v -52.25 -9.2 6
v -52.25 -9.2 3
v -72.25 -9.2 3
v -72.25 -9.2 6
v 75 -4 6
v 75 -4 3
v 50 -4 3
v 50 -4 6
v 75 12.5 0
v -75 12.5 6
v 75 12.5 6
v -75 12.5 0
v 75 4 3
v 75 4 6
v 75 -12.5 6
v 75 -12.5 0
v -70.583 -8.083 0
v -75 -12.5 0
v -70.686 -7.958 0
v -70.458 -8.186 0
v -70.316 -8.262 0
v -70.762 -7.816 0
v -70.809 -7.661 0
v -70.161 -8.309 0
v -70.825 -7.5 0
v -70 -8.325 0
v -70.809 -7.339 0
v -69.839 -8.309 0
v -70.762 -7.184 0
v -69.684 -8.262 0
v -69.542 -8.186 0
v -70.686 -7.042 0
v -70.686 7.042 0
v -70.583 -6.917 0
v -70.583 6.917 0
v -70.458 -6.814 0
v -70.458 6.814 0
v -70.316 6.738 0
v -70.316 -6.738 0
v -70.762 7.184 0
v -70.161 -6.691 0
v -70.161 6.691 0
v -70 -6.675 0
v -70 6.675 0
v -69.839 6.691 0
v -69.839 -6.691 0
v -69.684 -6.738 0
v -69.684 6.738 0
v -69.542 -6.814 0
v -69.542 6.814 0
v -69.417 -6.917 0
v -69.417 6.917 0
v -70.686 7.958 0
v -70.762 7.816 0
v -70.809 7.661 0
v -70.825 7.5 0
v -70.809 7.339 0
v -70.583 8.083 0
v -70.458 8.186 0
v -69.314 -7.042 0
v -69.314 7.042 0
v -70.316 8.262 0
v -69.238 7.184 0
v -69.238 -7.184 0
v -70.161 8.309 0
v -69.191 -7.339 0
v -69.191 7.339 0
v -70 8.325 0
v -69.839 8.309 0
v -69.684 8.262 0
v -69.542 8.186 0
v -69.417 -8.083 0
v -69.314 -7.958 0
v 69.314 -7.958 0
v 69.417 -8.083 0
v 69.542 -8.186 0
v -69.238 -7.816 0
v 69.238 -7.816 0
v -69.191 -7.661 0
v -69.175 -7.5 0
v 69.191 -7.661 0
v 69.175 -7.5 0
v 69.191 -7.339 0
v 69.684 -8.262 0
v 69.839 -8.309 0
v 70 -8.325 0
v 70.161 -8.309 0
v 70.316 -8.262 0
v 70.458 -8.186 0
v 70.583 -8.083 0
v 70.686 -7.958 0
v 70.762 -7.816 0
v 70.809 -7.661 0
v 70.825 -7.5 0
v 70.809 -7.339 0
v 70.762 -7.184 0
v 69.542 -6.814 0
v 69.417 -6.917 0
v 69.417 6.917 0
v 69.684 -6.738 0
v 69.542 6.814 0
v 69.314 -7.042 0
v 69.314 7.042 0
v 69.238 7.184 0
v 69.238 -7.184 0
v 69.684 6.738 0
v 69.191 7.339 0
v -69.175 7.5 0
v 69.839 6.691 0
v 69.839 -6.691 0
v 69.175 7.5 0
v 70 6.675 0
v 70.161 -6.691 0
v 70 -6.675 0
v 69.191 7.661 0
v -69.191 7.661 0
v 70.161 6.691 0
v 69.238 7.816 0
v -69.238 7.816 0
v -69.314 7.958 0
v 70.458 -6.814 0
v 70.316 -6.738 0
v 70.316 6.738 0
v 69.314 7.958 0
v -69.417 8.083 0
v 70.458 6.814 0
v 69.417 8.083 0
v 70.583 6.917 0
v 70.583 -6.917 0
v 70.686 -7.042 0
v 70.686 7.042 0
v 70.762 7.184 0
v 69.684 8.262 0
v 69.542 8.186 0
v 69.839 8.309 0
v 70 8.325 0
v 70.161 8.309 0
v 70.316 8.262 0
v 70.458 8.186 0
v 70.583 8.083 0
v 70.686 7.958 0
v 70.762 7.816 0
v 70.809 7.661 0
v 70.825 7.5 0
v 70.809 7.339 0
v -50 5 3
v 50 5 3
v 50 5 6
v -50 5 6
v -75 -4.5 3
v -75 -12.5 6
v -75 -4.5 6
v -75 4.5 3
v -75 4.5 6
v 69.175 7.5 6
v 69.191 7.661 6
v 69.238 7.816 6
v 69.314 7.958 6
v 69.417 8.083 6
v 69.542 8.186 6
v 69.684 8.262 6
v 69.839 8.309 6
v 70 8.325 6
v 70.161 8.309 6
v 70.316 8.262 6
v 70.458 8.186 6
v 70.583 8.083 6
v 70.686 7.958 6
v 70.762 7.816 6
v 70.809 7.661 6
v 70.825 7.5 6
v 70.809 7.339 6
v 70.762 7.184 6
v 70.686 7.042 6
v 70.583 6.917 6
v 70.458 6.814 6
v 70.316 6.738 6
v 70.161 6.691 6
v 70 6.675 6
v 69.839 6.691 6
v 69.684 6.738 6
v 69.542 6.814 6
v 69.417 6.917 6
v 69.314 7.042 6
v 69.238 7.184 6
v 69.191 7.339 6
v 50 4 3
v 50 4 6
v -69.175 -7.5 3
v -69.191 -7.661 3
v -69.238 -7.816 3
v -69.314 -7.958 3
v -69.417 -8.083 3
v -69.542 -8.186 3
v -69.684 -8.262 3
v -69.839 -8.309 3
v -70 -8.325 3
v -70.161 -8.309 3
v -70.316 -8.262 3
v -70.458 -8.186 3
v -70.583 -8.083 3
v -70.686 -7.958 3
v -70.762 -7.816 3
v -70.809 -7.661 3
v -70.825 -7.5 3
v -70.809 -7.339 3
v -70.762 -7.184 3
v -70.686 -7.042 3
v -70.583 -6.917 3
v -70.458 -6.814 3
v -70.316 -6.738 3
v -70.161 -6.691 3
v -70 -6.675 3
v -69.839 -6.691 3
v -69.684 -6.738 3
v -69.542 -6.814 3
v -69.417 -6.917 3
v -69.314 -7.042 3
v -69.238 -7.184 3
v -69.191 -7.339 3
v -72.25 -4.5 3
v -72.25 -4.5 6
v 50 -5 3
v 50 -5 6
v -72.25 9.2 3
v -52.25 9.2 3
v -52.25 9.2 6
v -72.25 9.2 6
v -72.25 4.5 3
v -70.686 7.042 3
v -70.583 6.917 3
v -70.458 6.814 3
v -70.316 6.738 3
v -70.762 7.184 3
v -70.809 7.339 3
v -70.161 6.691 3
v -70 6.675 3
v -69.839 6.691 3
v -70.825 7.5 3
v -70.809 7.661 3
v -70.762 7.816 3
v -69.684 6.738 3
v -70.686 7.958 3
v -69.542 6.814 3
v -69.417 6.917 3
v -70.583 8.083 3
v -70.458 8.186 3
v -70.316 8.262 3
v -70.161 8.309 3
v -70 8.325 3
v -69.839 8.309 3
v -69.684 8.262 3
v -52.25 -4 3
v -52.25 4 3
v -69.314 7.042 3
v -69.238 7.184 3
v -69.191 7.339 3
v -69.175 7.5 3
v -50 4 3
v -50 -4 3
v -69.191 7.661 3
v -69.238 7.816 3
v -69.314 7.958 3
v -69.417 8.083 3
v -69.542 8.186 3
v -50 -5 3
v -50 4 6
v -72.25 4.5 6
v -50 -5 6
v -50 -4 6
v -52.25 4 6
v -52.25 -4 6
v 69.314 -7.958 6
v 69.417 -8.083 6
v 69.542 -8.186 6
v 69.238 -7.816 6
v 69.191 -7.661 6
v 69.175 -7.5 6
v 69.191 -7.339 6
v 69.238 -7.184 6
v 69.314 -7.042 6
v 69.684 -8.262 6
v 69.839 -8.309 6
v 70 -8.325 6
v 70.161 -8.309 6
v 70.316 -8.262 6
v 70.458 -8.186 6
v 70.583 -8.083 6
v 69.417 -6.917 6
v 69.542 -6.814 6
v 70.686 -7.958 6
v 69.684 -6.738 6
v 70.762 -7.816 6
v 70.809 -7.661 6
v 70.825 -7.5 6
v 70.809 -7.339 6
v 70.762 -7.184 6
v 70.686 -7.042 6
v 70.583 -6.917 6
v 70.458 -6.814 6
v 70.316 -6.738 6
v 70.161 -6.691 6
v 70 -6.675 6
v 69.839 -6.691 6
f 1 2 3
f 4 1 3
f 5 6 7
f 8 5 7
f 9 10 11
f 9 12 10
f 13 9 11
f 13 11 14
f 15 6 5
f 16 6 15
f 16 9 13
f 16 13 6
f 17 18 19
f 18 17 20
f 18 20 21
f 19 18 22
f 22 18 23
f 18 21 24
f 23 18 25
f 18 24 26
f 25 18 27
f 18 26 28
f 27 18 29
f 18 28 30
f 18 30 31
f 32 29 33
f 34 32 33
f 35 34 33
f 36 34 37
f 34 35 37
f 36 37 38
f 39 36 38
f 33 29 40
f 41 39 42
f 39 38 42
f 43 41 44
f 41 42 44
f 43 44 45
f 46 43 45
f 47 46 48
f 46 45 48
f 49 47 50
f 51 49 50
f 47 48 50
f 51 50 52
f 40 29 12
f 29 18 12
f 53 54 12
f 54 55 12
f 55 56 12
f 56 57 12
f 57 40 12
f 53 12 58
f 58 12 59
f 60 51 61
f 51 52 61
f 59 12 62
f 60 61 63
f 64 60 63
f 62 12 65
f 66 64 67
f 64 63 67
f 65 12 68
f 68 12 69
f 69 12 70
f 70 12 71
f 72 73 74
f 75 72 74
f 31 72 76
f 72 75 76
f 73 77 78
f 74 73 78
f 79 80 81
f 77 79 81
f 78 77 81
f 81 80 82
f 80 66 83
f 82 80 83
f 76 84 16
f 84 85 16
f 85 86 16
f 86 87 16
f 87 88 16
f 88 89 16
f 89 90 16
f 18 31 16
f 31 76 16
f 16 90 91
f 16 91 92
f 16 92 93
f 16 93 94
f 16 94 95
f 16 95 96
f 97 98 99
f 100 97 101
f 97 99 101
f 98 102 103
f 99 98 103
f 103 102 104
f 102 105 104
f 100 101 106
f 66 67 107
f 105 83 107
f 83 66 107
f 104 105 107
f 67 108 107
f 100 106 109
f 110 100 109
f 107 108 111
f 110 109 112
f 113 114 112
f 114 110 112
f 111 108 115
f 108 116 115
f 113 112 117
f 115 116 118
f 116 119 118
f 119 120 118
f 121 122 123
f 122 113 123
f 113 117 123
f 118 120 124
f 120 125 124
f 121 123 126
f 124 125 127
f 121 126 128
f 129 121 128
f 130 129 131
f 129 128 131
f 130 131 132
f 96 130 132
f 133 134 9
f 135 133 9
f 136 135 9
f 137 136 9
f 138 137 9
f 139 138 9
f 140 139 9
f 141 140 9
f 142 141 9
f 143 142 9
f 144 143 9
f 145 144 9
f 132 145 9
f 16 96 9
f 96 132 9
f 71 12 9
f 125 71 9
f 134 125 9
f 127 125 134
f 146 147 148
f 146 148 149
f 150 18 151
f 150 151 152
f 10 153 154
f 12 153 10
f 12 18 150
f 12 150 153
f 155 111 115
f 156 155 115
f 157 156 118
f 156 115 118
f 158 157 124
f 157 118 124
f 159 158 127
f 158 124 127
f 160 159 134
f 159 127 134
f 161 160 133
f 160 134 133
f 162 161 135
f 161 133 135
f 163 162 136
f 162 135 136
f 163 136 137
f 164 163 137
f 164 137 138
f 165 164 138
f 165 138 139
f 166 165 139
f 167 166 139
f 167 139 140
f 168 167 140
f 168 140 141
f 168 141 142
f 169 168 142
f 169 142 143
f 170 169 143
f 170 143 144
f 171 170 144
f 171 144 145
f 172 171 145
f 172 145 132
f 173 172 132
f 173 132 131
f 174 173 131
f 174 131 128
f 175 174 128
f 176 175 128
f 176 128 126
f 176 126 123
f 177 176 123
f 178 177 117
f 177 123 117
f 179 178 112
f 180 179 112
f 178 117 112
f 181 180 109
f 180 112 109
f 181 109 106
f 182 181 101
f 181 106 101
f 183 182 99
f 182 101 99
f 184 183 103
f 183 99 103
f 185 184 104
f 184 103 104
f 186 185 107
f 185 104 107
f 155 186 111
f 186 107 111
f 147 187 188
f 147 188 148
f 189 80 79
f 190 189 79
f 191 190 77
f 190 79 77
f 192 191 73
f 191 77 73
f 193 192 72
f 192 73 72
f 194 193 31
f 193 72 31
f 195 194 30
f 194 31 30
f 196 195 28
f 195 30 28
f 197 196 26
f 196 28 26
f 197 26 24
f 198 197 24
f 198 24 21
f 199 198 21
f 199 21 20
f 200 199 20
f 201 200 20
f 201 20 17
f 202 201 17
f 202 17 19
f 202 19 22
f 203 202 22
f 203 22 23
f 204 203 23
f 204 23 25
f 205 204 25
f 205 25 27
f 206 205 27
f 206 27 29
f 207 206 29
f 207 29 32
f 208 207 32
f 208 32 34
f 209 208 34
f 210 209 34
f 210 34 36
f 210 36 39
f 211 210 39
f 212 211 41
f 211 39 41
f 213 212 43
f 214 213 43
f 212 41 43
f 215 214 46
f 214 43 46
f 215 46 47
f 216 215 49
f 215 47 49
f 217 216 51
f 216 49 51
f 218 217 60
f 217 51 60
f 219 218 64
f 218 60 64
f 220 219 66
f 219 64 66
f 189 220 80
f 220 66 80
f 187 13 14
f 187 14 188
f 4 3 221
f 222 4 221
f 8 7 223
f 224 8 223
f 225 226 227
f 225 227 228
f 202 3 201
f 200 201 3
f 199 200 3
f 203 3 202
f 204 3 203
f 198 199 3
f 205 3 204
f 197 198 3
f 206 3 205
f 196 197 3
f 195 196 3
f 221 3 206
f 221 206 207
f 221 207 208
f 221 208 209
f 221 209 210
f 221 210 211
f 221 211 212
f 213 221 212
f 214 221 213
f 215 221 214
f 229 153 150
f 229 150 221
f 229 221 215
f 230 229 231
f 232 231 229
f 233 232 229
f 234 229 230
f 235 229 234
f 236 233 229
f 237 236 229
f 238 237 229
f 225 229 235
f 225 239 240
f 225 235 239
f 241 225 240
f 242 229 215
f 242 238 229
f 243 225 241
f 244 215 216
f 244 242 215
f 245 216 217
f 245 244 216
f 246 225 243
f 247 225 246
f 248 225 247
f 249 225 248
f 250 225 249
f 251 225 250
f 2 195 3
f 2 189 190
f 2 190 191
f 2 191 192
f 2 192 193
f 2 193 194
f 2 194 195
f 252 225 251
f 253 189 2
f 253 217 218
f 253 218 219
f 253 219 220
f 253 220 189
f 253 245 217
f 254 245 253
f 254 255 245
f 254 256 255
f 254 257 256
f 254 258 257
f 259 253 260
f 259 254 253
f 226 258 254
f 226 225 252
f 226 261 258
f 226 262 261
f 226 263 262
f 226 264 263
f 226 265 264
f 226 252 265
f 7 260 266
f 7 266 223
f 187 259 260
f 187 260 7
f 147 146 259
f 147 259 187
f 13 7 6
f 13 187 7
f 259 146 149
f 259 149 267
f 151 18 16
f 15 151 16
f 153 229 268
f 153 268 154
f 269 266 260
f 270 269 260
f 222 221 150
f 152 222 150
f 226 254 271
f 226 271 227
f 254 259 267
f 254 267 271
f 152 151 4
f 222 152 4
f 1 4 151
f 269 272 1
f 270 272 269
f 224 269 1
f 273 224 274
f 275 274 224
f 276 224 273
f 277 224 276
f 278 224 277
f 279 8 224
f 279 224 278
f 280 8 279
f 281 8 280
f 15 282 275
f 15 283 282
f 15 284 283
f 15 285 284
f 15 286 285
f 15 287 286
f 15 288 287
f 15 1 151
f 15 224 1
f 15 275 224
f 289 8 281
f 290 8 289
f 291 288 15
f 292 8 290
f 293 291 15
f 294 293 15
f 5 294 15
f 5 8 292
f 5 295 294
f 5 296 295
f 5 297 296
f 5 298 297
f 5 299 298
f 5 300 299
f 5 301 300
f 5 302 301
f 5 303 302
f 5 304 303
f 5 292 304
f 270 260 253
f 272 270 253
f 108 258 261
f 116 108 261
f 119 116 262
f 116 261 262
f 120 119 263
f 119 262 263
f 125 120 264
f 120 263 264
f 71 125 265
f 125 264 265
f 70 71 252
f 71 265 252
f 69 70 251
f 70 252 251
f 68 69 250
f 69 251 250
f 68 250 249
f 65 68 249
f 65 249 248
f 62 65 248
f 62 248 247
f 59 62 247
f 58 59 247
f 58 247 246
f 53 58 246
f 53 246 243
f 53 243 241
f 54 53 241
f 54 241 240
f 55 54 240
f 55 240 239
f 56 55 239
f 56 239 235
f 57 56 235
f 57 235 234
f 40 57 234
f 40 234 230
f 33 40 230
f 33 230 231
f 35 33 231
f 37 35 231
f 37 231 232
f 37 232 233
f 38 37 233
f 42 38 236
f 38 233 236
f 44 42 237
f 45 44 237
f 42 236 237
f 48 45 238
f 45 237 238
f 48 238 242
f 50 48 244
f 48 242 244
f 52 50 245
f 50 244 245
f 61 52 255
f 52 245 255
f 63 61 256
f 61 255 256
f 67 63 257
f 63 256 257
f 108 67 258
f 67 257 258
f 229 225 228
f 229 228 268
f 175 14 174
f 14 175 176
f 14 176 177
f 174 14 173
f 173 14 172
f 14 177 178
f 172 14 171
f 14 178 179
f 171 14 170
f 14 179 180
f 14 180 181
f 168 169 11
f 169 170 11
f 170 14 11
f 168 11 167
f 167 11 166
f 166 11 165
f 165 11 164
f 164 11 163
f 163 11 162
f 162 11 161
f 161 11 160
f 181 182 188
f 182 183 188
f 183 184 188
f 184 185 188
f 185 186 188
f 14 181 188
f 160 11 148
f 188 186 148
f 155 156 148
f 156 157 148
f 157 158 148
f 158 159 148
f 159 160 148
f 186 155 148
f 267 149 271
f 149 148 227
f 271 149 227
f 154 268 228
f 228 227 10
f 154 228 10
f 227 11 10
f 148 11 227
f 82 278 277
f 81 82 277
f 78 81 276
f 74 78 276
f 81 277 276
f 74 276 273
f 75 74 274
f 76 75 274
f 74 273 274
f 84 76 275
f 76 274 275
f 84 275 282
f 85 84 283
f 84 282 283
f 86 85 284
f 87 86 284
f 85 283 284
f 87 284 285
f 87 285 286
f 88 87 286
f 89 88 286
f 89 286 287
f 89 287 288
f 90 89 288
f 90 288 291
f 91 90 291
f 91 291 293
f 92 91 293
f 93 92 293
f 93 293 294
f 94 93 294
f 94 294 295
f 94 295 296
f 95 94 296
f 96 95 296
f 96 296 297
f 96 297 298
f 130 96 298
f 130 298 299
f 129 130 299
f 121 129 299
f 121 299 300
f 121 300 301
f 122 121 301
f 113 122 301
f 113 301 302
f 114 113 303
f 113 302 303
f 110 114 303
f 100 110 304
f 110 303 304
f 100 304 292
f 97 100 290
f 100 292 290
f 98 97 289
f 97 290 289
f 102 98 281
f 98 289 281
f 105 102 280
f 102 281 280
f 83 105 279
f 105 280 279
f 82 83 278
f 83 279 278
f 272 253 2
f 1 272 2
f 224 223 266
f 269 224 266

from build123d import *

# Parameters (mm, degrees)
SKETCH_W              = 150
SKETCH_H              = 25
PAD_DEPTH             = 3
PAD001_DEPTH          = 3
SKETCH003_R           = 0.825
POCKET_DEPTH          = 313.375769
POLARPATTERN_COUNT    = 2
POLARPATTERN001_COUNT = 2
POLARPATTERN002_COUNT = 2


with BuildPart() as part:
    # Sketch → Pad (new body)
    with BuildSketch(Plane.XY):
        Rectangle(SKETCH_W, SKETCH_H)
    extrude(amount=PAD_DEPTH)

    # Sketch001 (on Face6 of Pad) → Pad001 (join)
    with BuildSketch(Plane.XY.offset(3)):
        Polygon((-75, 12.5), (75, 12.5), (75, 4), (50, 4), (50, 5), (-50, 5), (-50, 4), (-52.25, 4), (-52.25, 9.2), (-72.25, 9.2), (-72.25, 4.5), (-75, 4.5), align=None)
        Polygon((-75, -12.5), (75, -12.5), (75, -4), (50, -4), (50, -5), (-50, -5), (-50, -4), (-52.25, -4), (-52.25, -9.2), (-72.25, -9.2), (-72.25, -4.5), (-75, -4.5), align=None)
    extrude(amount=PAD001_DEPTH)

    # Sketch003 → Pocket (cut, through all)
    with BuildSketch(Plane.XY.offset(9)):
        with Locations((-70, 7.5)):
            Circle(SKETCH003_R)
    pocket = extrude(amount=-POCKET_DEPTH, mode=Mode.SUBTRACT)

    # PolarPattern: Pocket ×2 about axis
    polarpattern_axis = Axis((0, 0, 0), (0, 1, 0))
    for i in range(1, POLARPATTERN_COUNT):
        add(pocket.rotate(polarpattern_axis, i * 360 / POLARPATTERN_COUNT), mode=Mode.SUBTRACT)

    # PolarPattern001: Pocket ×2 about axis
    polarpattern001_axis = Axis((0, 0, 0), (1, 0, 0))
    for i in range(1, POLARPATTERN001_COUNT):
        add(pocket.rotate(polarpattern001_axis, i * 360 / POLARPATTERN001_COUNT), mode=Mode.SUBTRACT)

    # PolarPattern002: Pocket ×2 about axis
    polarpattern002_axis = Axis((0, 0, 9), (0, 0, 1))
    for i in range(1, POLARPATTERN002_COUNT):
        add(pocket.rotate(polarpattern002_axis, i * 360 / POLARPATTERN002_COUNT), mode=Mode.SUBTRACT)


solid = part.part
